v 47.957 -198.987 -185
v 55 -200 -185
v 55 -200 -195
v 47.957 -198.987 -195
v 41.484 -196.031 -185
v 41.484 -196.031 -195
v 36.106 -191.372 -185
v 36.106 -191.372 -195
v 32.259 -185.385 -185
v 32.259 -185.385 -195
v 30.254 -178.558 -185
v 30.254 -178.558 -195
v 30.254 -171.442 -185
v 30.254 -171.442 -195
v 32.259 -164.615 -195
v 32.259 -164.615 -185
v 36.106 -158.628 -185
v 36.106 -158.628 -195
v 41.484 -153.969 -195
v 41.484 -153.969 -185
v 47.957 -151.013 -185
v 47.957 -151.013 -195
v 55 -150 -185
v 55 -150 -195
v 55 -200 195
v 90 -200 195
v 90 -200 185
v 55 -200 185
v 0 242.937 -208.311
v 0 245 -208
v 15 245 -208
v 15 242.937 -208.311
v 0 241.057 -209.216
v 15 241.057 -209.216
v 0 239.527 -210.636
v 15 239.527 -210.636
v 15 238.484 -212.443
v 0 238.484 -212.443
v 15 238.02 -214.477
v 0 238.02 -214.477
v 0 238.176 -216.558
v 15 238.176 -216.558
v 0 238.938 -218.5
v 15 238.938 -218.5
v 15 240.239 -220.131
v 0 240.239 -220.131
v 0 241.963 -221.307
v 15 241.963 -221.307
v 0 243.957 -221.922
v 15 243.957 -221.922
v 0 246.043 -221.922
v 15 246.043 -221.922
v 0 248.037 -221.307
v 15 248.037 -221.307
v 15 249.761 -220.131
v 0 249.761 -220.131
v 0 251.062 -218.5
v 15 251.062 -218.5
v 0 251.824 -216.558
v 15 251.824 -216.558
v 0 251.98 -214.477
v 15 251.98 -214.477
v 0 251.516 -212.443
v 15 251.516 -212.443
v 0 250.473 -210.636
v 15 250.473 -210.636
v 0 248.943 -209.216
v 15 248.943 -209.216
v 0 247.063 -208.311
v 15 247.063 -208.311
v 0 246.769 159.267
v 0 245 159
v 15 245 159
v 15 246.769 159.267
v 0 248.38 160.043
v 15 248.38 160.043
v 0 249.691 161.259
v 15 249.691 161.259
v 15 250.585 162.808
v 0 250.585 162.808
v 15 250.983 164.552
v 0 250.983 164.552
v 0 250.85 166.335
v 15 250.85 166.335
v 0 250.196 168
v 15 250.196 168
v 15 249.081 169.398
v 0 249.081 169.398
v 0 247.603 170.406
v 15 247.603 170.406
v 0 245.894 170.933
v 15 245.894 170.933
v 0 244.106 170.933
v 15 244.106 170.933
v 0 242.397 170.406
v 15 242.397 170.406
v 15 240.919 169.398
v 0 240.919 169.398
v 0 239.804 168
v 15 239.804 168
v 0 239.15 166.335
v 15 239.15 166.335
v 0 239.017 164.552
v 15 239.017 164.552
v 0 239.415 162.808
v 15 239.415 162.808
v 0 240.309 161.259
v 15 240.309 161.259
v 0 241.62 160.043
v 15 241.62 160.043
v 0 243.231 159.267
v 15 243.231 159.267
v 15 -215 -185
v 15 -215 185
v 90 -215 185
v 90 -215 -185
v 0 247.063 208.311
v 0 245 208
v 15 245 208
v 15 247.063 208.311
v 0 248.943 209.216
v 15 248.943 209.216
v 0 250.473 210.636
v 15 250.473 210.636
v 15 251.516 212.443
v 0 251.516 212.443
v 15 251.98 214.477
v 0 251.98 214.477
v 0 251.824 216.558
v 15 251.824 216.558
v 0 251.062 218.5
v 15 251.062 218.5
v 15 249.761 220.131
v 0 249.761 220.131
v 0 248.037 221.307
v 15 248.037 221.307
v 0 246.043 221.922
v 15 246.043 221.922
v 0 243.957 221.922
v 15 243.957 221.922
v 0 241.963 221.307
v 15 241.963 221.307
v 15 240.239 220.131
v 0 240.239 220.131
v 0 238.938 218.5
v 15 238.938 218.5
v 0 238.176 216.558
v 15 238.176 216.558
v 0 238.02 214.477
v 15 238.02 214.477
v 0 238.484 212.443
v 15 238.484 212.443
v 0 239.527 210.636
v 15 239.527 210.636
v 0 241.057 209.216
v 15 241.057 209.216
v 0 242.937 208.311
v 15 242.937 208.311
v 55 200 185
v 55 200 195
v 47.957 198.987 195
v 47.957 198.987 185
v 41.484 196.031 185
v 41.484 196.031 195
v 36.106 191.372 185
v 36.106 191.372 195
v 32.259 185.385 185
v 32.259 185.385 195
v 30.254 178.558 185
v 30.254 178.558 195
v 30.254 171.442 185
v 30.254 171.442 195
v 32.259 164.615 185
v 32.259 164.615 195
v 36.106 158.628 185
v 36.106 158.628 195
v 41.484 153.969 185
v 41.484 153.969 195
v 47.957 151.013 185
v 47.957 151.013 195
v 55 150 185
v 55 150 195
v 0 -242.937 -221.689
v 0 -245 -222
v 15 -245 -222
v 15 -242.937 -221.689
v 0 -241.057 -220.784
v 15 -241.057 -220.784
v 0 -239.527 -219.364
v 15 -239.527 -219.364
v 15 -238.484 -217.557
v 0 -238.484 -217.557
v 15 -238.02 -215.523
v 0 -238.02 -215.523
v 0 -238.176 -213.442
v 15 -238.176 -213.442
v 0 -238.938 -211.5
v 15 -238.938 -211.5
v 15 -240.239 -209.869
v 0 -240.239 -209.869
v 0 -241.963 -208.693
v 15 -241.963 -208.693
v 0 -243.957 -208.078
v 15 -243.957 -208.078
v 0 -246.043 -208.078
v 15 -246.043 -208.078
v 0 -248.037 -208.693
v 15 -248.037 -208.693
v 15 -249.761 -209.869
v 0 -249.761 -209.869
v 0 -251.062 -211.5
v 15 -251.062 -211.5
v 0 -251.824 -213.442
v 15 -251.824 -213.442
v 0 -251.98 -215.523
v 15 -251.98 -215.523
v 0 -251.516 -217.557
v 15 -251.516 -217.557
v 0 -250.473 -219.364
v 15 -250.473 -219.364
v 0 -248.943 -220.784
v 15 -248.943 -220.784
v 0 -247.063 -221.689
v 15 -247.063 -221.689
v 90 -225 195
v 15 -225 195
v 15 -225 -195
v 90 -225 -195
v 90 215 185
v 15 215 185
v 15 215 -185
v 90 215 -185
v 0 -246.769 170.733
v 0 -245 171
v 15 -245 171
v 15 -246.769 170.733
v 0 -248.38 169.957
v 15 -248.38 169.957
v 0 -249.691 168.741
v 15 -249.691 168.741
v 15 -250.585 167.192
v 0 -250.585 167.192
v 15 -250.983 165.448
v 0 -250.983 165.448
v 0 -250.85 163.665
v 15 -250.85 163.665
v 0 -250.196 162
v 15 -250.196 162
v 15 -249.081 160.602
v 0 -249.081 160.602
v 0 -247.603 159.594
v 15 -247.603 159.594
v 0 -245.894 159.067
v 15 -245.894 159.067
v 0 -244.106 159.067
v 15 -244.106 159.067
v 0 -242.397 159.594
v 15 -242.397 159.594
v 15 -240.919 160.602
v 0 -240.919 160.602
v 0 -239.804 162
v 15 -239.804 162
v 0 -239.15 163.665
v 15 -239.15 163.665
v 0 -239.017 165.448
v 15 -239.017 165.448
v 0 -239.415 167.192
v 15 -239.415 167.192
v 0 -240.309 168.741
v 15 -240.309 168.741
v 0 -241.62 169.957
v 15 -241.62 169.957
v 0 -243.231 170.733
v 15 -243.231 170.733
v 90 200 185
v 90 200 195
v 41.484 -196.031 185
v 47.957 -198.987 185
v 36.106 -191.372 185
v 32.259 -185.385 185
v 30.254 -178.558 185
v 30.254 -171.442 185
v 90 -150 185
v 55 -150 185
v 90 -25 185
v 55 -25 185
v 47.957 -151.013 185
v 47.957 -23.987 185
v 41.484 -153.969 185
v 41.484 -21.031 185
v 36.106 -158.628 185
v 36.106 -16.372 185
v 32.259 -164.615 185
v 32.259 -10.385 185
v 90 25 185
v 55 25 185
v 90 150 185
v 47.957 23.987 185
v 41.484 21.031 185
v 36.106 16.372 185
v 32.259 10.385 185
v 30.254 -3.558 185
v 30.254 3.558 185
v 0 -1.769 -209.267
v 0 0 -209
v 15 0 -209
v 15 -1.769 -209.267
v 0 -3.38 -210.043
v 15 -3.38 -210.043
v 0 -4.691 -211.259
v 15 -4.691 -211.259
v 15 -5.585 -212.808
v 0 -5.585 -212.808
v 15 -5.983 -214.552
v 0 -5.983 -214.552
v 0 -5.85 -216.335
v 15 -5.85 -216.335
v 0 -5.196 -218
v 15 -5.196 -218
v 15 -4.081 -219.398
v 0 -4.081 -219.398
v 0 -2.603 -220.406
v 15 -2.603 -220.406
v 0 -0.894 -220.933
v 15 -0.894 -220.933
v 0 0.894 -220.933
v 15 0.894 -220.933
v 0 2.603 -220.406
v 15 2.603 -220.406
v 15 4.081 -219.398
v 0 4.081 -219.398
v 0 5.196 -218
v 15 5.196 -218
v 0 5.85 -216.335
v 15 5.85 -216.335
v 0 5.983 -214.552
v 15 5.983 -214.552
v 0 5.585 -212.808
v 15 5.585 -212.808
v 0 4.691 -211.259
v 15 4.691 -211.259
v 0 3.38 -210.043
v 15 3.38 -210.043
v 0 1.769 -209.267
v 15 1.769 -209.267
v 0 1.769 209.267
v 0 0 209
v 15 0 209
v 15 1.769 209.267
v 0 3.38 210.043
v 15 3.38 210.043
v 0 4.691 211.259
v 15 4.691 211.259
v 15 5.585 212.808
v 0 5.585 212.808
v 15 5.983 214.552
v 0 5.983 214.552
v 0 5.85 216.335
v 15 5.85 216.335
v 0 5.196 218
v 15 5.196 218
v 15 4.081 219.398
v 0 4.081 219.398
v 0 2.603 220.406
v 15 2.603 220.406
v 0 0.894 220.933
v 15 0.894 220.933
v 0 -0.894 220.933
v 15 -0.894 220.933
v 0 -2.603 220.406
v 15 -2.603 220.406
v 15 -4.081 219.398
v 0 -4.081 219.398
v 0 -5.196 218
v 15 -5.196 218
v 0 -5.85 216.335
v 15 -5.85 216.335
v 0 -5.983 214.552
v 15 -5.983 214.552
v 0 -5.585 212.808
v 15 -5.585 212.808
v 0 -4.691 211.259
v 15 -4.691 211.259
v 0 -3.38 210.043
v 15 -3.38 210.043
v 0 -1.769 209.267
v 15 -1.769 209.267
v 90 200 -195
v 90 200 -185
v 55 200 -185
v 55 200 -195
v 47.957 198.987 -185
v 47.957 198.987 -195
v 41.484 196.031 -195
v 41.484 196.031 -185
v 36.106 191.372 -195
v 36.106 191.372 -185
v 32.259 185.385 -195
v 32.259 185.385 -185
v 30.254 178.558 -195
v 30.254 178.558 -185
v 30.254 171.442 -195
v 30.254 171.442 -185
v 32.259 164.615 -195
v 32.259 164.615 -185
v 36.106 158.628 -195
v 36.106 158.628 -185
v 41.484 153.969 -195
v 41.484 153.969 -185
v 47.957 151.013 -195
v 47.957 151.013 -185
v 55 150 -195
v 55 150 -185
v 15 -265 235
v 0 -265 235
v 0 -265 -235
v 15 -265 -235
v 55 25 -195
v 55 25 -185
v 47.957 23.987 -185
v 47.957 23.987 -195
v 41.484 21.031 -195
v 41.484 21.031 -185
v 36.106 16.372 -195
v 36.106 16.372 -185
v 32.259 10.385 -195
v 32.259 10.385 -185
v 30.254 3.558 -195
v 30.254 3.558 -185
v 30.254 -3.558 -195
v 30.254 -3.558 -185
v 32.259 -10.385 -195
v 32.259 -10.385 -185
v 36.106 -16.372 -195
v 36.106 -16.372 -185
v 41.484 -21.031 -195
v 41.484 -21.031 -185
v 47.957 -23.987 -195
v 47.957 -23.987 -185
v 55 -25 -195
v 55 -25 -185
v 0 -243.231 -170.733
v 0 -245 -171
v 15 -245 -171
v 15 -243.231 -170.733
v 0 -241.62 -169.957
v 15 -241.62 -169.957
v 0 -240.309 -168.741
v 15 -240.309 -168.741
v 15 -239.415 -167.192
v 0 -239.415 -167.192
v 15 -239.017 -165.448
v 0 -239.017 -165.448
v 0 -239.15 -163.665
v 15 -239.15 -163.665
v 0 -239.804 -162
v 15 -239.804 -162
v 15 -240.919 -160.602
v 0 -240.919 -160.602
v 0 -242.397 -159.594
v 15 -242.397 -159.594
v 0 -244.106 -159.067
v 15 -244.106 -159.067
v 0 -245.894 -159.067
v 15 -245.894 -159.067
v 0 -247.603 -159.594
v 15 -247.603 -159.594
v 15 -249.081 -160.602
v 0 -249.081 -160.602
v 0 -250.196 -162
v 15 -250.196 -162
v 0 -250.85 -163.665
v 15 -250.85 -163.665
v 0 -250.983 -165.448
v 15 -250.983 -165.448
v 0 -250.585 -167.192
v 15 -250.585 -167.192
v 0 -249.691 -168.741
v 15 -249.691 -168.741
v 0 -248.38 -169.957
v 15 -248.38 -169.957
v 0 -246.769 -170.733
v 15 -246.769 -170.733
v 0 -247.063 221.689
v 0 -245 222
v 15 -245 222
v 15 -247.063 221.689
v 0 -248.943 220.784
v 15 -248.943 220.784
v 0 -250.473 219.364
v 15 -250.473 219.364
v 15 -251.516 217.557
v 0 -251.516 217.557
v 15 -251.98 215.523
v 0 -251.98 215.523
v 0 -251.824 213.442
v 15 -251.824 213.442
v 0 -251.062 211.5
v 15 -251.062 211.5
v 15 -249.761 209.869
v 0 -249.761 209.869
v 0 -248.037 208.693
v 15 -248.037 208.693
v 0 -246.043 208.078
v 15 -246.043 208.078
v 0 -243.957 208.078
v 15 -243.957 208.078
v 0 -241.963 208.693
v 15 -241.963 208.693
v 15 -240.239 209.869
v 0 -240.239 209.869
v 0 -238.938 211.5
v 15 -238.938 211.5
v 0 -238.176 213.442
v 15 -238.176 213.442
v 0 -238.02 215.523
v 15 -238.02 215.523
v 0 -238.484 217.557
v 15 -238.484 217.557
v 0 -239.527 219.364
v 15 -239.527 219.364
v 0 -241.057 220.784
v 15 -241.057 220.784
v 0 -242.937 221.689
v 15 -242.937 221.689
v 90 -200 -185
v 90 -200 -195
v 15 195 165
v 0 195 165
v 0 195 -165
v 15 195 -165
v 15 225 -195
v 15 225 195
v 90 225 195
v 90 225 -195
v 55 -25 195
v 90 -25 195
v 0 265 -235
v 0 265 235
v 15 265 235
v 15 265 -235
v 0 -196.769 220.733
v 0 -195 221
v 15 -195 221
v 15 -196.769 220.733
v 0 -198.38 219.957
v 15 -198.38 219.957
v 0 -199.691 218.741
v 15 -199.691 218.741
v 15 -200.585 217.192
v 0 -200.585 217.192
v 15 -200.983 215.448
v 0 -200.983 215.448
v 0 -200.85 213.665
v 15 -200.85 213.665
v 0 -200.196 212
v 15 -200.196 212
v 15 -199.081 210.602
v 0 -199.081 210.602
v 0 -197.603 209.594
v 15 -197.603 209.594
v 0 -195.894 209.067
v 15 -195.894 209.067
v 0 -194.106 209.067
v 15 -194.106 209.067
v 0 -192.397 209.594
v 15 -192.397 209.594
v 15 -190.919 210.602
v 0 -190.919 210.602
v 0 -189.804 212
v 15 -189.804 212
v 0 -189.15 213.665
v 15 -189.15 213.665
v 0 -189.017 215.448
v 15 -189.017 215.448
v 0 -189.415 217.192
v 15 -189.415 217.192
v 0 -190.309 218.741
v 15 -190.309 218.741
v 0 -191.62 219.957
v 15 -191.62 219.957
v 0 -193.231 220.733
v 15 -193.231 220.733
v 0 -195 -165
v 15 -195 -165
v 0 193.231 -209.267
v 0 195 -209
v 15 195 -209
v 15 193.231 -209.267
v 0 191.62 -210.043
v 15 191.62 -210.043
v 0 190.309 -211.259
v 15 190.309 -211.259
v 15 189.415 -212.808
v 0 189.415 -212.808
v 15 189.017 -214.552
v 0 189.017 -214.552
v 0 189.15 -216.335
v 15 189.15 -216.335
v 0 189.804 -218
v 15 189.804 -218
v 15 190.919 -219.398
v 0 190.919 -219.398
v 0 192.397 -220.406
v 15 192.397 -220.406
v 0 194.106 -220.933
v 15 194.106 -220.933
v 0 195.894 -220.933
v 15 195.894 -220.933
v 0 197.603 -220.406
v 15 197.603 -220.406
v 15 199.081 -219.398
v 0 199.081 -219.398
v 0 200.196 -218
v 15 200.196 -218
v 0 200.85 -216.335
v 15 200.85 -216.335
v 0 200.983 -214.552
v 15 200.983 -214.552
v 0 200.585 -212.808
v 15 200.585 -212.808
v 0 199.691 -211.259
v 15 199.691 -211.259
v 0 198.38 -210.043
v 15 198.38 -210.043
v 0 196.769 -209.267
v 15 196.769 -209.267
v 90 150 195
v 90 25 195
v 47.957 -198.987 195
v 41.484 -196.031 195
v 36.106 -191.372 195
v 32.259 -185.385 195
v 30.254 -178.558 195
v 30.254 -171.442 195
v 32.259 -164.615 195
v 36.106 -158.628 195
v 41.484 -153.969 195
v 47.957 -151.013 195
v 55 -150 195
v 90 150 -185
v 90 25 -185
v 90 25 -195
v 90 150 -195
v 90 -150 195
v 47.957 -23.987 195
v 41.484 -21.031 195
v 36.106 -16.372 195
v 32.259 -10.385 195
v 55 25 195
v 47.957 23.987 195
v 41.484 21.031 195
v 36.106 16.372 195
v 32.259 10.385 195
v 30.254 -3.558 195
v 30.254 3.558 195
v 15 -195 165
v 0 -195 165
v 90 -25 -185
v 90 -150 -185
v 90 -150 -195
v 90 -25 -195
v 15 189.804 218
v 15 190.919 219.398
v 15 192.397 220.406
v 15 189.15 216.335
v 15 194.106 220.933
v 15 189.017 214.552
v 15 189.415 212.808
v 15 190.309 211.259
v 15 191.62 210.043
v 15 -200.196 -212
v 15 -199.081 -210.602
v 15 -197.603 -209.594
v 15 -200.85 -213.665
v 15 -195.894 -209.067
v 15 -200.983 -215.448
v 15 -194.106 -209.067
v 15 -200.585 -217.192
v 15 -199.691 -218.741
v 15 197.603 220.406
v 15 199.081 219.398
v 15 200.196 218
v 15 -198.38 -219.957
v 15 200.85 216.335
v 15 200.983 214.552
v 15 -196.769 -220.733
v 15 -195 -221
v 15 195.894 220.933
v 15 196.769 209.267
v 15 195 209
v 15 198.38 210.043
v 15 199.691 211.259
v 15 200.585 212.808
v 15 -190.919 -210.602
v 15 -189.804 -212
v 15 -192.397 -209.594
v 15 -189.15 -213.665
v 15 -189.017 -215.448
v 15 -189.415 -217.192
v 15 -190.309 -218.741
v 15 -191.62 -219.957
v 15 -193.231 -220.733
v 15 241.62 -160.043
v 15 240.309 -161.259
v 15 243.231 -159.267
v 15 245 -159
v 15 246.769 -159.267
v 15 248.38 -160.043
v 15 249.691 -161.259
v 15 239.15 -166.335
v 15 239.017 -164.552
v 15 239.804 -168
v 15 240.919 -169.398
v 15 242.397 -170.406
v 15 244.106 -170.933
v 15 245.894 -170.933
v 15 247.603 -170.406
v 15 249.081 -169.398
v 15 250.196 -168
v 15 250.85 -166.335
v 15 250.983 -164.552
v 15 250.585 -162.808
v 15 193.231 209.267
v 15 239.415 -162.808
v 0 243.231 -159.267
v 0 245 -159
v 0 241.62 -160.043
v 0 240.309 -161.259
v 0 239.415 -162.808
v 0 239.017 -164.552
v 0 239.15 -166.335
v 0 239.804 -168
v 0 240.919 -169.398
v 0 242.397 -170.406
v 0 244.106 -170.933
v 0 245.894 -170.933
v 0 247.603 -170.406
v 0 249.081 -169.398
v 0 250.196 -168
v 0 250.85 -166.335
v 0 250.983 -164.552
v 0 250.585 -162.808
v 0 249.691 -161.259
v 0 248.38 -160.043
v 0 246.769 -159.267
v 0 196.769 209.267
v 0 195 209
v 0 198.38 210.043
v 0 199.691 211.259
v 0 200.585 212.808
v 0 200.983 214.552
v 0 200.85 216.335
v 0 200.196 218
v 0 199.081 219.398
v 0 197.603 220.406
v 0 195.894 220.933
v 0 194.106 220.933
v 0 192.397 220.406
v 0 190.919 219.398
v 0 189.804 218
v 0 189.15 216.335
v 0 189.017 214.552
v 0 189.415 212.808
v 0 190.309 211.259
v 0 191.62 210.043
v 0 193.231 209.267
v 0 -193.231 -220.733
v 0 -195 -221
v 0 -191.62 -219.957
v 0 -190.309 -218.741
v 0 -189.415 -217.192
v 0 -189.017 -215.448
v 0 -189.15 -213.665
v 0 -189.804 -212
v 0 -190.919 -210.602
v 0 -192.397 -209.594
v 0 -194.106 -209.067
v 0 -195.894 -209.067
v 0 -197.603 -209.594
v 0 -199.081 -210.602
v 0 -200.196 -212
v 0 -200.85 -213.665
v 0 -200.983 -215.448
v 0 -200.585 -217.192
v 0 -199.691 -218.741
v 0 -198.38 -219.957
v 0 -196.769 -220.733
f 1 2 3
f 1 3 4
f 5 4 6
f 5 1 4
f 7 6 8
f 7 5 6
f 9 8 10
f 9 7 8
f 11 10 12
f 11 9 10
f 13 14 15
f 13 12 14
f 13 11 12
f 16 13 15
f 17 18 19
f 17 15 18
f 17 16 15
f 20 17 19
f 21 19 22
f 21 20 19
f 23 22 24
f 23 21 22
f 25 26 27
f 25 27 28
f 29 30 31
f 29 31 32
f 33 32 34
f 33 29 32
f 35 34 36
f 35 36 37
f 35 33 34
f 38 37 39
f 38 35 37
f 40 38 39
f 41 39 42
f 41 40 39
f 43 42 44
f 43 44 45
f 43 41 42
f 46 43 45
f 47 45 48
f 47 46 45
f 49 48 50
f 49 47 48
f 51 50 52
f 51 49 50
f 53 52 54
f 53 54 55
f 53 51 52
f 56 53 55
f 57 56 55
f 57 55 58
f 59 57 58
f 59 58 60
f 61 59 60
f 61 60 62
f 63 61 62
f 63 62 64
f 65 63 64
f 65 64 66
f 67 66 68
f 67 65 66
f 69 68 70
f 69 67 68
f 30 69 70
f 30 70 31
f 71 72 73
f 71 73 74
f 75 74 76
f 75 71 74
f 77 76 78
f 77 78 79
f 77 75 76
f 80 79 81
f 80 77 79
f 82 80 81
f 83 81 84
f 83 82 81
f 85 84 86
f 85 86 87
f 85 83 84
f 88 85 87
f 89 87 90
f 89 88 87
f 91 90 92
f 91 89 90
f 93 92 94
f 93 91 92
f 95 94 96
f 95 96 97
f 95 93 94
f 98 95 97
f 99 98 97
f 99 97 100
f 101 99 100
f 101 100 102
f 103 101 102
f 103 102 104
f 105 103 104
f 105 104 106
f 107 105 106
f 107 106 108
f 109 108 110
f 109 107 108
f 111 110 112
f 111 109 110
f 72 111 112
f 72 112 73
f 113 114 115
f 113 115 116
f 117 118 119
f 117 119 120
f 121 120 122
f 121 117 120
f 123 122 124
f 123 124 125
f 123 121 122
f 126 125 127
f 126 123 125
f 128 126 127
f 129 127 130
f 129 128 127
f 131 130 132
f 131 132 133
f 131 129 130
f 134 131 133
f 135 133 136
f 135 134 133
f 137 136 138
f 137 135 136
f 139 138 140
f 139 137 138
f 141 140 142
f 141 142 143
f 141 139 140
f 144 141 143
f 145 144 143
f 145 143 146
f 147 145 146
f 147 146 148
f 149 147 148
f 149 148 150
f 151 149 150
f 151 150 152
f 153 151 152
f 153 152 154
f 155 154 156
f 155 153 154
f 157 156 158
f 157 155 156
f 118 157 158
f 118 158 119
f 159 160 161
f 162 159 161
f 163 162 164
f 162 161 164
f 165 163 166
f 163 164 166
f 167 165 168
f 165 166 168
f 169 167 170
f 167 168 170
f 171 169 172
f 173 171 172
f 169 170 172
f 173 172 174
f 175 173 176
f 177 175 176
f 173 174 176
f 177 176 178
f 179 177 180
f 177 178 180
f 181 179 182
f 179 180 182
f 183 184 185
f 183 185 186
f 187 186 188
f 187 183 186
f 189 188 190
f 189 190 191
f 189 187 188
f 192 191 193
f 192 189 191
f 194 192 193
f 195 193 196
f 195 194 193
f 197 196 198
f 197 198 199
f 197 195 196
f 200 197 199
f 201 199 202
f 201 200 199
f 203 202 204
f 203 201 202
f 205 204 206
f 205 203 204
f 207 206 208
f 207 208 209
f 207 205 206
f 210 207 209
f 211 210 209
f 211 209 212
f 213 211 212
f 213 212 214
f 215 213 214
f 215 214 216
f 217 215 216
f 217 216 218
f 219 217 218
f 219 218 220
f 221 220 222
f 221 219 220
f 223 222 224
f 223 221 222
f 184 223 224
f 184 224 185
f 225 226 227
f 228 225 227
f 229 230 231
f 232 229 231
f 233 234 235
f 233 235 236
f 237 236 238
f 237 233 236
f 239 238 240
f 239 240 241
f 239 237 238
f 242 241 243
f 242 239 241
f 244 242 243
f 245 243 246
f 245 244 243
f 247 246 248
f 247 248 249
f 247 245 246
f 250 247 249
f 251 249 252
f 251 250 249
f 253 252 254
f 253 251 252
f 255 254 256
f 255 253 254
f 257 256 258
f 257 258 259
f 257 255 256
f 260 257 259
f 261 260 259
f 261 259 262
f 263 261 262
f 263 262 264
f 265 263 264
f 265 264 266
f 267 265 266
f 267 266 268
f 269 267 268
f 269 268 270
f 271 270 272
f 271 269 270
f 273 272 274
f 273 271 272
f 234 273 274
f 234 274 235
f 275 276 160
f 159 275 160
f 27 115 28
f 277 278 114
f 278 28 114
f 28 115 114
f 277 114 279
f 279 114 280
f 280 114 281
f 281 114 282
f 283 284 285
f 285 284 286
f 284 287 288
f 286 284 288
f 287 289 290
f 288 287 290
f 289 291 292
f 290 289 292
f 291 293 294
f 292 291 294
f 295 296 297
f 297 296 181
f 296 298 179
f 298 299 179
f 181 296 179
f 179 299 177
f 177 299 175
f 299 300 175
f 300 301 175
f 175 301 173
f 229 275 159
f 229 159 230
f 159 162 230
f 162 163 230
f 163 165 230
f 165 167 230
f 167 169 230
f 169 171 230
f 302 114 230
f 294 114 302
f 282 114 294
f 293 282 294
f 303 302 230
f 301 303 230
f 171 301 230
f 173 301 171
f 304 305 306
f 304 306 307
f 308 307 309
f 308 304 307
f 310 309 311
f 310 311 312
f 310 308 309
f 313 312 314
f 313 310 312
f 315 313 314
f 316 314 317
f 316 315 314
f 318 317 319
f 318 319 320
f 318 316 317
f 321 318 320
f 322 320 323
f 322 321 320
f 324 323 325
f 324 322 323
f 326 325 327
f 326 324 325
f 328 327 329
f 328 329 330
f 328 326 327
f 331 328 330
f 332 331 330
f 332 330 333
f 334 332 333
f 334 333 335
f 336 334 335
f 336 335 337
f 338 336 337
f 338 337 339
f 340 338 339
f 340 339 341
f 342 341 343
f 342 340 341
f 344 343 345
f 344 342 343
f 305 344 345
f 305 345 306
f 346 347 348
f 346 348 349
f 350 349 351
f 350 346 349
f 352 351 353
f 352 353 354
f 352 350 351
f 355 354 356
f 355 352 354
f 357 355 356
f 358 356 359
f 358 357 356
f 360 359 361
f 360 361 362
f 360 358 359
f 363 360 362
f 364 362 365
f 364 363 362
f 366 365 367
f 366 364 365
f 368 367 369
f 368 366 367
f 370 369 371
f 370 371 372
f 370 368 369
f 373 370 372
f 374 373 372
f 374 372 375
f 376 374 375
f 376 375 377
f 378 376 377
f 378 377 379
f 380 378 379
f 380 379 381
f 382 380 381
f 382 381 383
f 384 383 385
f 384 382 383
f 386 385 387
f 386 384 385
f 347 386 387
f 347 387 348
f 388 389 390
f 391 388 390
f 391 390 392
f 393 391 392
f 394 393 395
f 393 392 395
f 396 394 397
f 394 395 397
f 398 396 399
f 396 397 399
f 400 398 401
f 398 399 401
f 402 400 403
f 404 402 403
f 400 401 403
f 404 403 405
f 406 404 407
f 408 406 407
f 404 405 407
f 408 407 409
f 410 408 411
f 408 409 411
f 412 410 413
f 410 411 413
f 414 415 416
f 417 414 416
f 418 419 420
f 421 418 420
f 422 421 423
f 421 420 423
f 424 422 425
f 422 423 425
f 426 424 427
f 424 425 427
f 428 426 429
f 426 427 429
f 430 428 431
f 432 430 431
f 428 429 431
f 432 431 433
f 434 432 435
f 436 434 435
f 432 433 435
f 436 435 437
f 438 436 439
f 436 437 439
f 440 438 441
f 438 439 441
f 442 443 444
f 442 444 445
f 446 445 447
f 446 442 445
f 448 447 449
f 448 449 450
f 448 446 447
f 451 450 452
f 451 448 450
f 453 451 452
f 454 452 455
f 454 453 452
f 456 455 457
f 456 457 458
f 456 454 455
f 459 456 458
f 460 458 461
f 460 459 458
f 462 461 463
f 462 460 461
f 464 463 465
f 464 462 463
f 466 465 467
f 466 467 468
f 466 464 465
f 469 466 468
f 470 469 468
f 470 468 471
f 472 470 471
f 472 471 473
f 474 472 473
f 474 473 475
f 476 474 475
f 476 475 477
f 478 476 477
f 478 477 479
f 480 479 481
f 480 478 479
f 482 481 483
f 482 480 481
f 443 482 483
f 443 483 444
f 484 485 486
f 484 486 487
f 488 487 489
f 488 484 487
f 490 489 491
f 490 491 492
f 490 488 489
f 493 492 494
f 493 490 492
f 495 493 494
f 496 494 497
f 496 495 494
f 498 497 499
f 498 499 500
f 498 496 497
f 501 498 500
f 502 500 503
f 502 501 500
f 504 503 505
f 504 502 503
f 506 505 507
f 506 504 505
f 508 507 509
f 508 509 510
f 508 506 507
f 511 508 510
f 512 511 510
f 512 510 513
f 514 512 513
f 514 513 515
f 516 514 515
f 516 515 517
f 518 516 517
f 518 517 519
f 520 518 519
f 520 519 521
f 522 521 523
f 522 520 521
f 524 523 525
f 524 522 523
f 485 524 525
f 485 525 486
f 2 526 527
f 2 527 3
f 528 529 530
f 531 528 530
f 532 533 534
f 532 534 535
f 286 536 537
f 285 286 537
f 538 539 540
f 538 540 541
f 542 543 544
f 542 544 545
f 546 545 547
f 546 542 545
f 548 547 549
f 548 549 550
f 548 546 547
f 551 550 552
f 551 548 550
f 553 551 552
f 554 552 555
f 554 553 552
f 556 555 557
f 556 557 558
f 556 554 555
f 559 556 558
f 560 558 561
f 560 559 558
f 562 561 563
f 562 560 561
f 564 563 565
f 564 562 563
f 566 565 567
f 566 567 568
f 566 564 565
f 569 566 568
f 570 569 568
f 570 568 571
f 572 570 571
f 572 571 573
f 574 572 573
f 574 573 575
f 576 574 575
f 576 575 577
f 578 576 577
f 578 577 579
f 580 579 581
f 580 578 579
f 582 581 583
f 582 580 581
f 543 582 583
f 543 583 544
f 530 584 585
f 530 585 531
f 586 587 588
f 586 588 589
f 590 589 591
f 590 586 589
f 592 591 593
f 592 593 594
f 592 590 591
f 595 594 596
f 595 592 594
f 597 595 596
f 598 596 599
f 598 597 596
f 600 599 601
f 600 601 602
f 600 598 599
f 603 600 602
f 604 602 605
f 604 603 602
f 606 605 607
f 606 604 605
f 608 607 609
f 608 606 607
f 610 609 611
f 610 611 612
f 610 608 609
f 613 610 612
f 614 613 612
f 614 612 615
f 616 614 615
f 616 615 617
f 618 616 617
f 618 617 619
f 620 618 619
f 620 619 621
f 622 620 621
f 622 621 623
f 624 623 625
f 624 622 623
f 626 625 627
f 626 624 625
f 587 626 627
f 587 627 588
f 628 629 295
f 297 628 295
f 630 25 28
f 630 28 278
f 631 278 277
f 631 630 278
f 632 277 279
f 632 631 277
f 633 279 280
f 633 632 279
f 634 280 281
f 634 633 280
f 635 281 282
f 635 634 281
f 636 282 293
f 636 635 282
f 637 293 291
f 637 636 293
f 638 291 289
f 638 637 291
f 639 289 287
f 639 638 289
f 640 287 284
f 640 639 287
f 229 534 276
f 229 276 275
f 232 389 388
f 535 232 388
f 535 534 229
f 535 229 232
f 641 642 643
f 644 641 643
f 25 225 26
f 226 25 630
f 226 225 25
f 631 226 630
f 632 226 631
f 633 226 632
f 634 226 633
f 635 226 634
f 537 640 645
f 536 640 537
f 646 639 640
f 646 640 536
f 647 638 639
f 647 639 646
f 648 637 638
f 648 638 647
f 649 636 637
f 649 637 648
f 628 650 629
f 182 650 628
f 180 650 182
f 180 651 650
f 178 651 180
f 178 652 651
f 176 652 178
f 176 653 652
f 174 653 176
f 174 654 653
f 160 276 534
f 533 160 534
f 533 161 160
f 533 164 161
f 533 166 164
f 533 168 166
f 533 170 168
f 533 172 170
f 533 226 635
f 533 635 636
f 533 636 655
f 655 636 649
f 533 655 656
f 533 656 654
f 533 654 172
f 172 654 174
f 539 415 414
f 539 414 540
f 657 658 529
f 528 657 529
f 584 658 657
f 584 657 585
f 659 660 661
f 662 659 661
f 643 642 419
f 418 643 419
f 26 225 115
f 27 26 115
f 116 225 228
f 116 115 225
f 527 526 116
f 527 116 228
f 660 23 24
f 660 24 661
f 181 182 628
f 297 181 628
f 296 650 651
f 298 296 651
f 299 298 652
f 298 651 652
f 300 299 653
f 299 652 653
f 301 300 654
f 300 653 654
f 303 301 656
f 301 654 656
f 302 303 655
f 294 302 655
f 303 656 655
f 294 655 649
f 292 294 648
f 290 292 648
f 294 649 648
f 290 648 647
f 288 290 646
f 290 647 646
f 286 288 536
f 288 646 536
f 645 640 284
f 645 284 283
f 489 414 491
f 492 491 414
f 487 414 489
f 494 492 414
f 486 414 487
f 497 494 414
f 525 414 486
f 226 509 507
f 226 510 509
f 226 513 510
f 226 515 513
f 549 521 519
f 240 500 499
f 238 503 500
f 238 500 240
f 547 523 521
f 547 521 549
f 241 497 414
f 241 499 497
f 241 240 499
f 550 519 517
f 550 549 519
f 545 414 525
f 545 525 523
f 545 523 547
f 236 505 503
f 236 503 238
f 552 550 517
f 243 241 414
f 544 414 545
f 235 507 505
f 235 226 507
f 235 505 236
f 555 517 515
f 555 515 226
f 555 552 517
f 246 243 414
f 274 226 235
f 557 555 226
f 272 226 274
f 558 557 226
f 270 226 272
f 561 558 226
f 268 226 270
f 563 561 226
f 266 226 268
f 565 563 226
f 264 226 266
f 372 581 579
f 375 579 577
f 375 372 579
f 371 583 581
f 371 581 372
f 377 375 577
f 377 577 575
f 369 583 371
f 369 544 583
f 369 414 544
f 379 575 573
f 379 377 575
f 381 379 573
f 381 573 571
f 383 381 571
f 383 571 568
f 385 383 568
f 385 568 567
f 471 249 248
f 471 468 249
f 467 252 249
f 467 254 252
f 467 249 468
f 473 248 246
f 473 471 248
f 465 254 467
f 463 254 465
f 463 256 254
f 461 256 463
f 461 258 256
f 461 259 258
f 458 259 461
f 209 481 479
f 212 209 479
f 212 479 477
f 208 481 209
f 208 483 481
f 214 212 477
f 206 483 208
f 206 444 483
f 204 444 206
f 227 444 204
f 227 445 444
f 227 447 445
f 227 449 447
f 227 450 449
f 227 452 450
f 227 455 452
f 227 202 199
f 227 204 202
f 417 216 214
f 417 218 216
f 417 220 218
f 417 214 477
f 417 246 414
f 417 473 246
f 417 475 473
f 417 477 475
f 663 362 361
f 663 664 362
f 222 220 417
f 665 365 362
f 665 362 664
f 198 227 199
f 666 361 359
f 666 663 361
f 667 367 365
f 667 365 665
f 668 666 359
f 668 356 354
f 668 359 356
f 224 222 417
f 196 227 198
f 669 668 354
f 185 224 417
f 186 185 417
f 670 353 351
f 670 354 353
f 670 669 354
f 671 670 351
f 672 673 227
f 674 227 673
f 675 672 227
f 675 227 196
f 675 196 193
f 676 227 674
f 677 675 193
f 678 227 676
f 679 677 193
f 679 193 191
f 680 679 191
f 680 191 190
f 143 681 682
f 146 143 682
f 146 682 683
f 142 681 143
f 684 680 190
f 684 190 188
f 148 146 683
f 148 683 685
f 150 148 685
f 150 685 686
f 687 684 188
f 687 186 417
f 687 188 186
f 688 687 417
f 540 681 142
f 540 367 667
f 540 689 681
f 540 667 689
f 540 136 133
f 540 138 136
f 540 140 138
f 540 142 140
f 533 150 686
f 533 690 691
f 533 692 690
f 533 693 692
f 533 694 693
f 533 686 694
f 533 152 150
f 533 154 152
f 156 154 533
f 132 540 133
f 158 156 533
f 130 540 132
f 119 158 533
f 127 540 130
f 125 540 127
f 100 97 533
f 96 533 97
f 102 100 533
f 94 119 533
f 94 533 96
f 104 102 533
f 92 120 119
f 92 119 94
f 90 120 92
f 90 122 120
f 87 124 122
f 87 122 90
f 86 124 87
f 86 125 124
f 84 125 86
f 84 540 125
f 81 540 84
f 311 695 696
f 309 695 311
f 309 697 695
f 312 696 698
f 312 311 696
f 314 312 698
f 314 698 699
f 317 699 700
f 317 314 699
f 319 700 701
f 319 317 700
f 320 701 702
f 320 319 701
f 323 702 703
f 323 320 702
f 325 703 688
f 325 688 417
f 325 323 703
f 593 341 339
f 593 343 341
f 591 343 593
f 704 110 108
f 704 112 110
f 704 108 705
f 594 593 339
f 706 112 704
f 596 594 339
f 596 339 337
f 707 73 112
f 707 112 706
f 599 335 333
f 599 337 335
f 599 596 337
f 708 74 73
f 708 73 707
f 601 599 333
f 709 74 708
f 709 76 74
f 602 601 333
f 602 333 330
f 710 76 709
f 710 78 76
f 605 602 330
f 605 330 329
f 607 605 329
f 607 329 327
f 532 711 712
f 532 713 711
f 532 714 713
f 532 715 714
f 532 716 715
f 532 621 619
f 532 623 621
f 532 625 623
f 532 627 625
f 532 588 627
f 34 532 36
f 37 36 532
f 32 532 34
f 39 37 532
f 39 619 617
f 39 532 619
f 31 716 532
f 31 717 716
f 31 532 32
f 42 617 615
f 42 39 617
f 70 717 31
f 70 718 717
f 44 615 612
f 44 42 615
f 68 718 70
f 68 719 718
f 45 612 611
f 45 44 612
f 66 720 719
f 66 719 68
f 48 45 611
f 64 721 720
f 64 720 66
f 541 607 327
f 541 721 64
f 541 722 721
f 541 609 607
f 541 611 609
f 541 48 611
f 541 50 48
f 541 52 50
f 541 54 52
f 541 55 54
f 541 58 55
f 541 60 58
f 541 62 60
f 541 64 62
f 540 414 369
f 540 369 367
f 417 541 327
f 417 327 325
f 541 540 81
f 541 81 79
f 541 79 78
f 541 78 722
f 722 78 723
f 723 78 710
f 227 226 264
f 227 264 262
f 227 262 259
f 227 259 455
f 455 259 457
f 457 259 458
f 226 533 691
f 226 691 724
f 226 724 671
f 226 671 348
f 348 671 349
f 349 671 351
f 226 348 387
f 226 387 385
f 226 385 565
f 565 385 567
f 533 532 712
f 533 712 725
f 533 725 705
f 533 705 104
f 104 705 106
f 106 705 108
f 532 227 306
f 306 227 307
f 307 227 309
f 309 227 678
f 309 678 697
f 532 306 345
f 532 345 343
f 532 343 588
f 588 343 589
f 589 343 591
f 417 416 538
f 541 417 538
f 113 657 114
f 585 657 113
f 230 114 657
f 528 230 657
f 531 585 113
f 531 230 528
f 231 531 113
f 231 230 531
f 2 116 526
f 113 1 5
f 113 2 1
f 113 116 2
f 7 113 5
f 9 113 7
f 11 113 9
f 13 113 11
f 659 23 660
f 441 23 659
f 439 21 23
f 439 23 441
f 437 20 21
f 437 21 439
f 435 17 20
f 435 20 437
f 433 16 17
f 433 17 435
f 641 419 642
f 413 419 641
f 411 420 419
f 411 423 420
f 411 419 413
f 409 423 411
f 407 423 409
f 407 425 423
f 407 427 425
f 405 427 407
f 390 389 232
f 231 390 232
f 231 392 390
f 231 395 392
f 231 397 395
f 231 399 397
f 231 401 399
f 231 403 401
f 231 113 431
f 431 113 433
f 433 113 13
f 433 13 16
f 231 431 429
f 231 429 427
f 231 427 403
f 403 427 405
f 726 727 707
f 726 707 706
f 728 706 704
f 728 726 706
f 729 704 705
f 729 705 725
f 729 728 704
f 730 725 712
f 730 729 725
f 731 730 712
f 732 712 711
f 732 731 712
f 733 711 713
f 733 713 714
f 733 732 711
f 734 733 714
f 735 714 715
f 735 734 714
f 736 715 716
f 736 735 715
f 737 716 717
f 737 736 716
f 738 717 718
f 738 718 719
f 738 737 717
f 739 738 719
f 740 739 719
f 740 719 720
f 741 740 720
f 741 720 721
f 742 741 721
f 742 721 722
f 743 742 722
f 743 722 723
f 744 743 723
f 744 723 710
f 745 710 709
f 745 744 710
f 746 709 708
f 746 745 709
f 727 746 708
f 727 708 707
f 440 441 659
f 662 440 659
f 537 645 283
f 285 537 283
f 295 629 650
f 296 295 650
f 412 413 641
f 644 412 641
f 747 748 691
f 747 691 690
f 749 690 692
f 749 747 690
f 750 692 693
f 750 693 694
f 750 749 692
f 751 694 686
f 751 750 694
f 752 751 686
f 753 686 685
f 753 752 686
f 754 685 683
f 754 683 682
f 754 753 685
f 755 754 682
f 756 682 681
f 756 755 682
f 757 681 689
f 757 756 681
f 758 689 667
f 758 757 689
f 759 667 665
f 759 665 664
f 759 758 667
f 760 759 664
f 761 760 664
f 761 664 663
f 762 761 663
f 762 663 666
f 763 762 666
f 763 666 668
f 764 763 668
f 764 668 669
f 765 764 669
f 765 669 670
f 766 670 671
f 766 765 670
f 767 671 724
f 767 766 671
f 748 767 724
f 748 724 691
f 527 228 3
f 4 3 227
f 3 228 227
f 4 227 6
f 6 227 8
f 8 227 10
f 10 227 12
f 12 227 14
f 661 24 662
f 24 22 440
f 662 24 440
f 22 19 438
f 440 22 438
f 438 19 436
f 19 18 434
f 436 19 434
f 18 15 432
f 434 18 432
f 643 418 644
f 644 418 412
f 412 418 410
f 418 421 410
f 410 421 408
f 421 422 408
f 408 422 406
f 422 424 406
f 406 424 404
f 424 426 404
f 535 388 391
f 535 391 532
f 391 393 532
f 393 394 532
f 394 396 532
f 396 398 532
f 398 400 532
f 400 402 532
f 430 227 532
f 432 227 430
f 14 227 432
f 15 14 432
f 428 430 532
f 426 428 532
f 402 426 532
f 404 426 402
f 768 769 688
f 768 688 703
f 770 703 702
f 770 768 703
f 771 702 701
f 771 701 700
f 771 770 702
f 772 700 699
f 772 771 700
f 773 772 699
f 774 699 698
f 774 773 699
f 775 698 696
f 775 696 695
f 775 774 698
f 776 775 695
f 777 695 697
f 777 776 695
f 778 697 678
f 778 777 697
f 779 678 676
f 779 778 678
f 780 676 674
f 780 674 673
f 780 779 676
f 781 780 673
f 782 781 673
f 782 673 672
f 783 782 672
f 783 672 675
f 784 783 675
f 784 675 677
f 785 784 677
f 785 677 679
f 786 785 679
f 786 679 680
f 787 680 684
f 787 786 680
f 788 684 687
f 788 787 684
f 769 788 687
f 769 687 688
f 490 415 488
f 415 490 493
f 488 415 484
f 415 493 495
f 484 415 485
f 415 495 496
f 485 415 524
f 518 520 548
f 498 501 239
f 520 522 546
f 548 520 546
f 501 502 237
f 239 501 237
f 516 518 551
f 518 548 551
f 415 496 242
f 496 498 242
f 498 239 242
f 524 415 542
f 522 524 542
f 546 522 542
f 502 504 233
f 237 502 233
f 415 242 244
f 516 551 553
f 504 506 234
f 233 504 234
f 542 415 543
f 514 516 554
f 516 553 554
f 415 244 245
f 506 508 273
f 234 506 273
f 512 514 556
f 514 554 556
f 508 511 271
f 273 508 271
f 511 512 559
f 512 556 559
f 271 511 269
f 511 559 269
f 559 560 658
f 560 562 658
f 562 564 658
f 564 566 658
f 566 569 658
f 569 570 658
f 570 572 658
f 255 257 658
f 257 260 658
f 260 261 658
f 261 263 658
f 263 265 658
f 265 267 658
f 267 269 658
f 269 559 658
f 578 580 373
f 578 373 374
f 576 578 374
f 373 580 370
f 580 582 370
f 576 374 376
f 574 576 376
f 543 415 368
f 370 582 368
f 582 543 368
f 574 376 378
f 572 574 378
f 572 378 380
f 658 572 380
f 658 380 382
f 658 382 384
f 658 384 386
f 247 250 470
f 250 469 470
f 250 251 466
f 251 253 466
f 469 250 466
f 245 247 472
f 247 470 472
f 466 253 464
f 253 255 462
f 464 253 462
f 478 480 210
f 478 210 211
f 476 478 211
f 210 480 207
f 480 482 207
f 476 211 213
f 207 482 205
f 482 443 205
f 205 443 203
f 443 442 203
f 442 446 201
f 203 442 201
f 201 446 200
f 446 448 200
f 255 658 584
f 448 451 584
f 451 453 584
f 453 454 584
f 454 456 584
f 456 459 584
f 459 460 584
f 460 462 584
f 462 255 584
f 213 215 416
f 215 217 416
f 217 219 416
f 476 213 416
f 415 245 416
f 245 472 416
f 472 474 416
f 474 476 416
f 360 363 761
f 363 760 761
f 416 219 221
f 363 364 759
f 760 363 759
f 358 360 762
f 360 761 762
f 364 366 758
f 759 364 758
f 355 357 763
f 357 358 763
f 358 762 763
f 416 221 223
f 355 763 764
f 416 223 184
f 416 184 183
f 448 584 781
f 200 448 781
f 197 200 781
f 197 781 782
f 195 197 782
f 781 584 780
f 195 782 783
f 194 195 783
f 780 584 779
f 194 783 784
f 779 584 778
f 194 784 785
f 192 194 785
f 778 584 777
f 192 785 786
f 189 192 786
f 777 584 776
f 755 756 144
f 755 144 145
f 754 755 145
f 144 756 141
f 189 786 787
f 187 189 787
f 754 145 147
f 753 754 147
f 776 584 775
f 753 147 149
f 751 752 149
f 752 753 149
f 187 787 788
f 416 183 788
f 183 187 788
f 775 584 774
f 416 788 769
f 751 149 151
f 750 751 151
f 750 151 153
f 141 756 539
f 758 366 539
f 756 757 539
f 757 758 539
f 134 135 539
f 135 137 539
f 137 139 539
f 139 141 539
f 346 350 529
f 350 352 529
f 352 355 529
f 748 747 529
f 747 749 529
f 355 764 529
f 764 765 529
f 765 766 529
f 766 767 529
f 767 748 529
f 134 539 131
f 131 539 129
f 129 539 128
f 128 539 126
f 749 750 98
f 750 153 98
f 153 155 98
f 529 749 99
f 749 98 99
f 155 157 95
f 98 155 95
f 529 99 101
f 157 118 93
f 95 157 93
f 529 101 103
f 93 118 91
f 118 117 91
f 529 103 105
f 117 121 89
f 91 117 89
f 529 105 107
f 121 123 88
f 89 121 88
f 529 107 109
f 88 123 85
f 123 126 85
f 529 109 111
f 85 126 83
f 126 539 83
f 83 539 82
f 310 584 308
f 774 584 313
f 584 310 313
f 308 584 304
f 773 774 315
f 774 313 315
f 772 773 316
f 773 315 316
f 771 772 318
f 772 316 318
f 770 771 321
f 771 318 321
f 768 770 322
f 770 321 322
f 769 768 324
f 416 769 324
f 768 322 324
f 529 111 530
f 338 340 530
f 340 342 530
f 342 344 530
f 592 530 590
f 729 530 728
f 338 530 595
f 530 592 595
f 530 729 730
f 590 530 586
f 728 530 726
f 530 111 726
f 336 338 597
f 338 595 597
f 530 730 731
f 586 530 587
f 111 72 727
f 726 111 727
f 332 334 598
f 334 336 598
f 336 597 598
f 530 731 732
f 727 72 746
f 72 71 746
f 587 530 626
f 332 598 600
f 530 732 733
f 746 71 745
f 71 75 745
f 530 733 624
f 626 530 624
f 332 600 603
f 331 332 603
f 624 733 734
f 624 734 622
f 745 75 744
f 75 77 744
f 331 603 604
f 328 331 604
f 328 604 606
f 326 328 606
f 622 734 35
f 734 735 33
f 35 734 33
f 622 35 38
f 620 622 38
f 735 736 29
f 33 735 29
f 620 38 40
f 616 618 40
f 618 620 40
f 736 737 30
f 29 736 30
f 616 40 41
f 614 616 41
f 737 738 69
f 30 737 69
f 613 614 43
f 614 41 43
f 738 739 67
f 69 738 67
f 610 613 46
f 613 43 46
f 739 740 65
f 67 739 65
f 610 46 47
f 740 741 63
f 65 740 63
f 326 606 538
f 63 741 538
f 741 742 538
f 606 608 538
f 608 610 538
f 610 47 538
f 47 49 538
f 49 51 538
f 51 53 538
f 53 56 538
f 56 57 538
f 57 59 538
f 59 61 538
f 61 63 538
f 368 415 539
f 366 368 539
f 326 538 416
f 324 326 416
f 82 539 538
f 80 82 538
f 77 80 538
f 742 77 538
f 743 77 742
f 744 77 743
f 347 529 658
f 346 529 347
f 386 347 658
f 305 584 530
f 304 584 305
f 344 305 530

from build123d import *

# Parameters (mm, degrees)
SKETCH_1_W          = 470
SKETCH_1_H          = 530
SKETCH_1_R          = 7
SKETCH_1_R_2        = 6
SKETCH_1_W_2        = 330
SKETCH_1_H_2        = 390
EXTRUDE_1_DEPTH     = 15
SKETCH_2_W          = 390
SKETCH_2_H          = 450
SKETCH_2_W_2        = 370
SKETCH_2_H_2        = 430
EXTRUDE_2_DEPTH     = 75
CUT_EXTRUDE_1_DEPTH = 514.054577993


with BuildPart() as part:
    # 草图1 → 凸台-拉伸1 (new body)
    with BuildSketch(Plane(origin=(0, 0, 0), x_dir=(0, 0, -1), z_dir=(1, 0, 0))):
        Rectangle(SKETCH_1_W, SKETCH_1_H)
        with Locations((-215, 245)):
            Circle(SKETCH_1_R, mode=Mode.SUBTRACT)
        with Locations((-165, 245)):
            Circle(SKETCH_1_R_2, mode=Mode.SUBTRACT)
        with Locations((-215, 195)):
            Circle(SKETCH_1_R_2, mode=Mode.SUBTRACT)
        with Locations(Location((215, 245, 0), (0, 0, 180))):
            Circle(SKETCH_1_R, mode=Mode.SUBTRACT)
        with Locations(Location((165, 245, 0), (0, 0, 180))):
            Circle(SKETCH_1_R_2, mode=Mode.SUBTRACT)
        with Locations(Location((215, 195, 0), (0, 0, 180))):
            Circle(SKETCH_1_R_2, mode=Mode.SUBTRACT)
        with Locations(Location((-215, -195, 0), (0, 0, 180))):
            Circle(SKETCH_1_R_2, mode=Mode.SUBTRACT)
        with Locations(Location((-165, -245, 0), (0, 0, 180))):
            Circle(SKETCH_1_R_2, mode=Mode.SUBTRACT)
        with Locations(Location((-215, -245, 0), (0, 0, 180))):
            Circle(SKETCH_1_R, mode=Mode.SUBTRACT)
        with Locations((165, -245)):
            Circle(SKETCH_1_R_2, mode=Mode.SUBTRACT)
        with Locations((215, -245)):
            Circle(SKETCH_1_R, mode=Mode.SUBTRACT)
        with Locations((215, -195)):
            Circle(SKETCH_1_R_2, mode=Mode.SUBTRACT)
        with Locations((-215, 0)):
            Circle(SKETCH_1_R_2, mode=Mode.SUBTRACT)
        with Locations(Location((215, 0, 0), (0, 0, 180))):
            Circle(SKETCH_1_R_2, mode=Mode.SUBTRACT)
        Rectangle(SKETCH_1_W_2, SKETCH_1_H_2, mode=Mode.SUBTRACT)
    extrude(amount=EXTRUDE_1_DEPTH)

    # 草图2 → 凸台-拉伸2 (add)
    with BuildSketch(Plane(origin=(15, 0, 0), x_dir=(0, 0, -1), z_dir=(1, 0, 0))):
        Rectangle(SKETCH_2_W, SKETCH_2_H)
        Rectangle(SKETCH_2_W_2, SKETCH_2_H_2, mode=Mode.SUBTRACT)
    extrude(amount=EXTRUDE_2_DEPTH)

    # 草图4 → 切除-拉伸1 (cut, through all)
    with BuildSketch(Plane.XY.offset(195)):
        with BuildLine():
            Line((90, 25), (55, 25))
            ThreePointArc((55, 25), (30, 0), (55, -25))
            Line((55, -25), (90, -25))
            Line((90, -25), (90, 25))
        make_face()
        with BuildLine():
            Line((90, 200), (55, 200))
            ThreePointArc((55, 200), (30, 175), (55, 150))
            Line((55, 150), (90, 150))
            Line((90, 150), (90, 200))
        make_face()
        with BuildLine():
            Line((90, -150), (90, -200))
            Line((90, -200), (55, -200))
            ThreePointArc((55, -200), (30, -175), (55, -150))
            Line((55, -150), (90, -150))
        make_face()
    extrude(amount=-CUT_EXTRUDE_1_DEPTH, mode=Mode.SUBTRACT)


solid = part.part
